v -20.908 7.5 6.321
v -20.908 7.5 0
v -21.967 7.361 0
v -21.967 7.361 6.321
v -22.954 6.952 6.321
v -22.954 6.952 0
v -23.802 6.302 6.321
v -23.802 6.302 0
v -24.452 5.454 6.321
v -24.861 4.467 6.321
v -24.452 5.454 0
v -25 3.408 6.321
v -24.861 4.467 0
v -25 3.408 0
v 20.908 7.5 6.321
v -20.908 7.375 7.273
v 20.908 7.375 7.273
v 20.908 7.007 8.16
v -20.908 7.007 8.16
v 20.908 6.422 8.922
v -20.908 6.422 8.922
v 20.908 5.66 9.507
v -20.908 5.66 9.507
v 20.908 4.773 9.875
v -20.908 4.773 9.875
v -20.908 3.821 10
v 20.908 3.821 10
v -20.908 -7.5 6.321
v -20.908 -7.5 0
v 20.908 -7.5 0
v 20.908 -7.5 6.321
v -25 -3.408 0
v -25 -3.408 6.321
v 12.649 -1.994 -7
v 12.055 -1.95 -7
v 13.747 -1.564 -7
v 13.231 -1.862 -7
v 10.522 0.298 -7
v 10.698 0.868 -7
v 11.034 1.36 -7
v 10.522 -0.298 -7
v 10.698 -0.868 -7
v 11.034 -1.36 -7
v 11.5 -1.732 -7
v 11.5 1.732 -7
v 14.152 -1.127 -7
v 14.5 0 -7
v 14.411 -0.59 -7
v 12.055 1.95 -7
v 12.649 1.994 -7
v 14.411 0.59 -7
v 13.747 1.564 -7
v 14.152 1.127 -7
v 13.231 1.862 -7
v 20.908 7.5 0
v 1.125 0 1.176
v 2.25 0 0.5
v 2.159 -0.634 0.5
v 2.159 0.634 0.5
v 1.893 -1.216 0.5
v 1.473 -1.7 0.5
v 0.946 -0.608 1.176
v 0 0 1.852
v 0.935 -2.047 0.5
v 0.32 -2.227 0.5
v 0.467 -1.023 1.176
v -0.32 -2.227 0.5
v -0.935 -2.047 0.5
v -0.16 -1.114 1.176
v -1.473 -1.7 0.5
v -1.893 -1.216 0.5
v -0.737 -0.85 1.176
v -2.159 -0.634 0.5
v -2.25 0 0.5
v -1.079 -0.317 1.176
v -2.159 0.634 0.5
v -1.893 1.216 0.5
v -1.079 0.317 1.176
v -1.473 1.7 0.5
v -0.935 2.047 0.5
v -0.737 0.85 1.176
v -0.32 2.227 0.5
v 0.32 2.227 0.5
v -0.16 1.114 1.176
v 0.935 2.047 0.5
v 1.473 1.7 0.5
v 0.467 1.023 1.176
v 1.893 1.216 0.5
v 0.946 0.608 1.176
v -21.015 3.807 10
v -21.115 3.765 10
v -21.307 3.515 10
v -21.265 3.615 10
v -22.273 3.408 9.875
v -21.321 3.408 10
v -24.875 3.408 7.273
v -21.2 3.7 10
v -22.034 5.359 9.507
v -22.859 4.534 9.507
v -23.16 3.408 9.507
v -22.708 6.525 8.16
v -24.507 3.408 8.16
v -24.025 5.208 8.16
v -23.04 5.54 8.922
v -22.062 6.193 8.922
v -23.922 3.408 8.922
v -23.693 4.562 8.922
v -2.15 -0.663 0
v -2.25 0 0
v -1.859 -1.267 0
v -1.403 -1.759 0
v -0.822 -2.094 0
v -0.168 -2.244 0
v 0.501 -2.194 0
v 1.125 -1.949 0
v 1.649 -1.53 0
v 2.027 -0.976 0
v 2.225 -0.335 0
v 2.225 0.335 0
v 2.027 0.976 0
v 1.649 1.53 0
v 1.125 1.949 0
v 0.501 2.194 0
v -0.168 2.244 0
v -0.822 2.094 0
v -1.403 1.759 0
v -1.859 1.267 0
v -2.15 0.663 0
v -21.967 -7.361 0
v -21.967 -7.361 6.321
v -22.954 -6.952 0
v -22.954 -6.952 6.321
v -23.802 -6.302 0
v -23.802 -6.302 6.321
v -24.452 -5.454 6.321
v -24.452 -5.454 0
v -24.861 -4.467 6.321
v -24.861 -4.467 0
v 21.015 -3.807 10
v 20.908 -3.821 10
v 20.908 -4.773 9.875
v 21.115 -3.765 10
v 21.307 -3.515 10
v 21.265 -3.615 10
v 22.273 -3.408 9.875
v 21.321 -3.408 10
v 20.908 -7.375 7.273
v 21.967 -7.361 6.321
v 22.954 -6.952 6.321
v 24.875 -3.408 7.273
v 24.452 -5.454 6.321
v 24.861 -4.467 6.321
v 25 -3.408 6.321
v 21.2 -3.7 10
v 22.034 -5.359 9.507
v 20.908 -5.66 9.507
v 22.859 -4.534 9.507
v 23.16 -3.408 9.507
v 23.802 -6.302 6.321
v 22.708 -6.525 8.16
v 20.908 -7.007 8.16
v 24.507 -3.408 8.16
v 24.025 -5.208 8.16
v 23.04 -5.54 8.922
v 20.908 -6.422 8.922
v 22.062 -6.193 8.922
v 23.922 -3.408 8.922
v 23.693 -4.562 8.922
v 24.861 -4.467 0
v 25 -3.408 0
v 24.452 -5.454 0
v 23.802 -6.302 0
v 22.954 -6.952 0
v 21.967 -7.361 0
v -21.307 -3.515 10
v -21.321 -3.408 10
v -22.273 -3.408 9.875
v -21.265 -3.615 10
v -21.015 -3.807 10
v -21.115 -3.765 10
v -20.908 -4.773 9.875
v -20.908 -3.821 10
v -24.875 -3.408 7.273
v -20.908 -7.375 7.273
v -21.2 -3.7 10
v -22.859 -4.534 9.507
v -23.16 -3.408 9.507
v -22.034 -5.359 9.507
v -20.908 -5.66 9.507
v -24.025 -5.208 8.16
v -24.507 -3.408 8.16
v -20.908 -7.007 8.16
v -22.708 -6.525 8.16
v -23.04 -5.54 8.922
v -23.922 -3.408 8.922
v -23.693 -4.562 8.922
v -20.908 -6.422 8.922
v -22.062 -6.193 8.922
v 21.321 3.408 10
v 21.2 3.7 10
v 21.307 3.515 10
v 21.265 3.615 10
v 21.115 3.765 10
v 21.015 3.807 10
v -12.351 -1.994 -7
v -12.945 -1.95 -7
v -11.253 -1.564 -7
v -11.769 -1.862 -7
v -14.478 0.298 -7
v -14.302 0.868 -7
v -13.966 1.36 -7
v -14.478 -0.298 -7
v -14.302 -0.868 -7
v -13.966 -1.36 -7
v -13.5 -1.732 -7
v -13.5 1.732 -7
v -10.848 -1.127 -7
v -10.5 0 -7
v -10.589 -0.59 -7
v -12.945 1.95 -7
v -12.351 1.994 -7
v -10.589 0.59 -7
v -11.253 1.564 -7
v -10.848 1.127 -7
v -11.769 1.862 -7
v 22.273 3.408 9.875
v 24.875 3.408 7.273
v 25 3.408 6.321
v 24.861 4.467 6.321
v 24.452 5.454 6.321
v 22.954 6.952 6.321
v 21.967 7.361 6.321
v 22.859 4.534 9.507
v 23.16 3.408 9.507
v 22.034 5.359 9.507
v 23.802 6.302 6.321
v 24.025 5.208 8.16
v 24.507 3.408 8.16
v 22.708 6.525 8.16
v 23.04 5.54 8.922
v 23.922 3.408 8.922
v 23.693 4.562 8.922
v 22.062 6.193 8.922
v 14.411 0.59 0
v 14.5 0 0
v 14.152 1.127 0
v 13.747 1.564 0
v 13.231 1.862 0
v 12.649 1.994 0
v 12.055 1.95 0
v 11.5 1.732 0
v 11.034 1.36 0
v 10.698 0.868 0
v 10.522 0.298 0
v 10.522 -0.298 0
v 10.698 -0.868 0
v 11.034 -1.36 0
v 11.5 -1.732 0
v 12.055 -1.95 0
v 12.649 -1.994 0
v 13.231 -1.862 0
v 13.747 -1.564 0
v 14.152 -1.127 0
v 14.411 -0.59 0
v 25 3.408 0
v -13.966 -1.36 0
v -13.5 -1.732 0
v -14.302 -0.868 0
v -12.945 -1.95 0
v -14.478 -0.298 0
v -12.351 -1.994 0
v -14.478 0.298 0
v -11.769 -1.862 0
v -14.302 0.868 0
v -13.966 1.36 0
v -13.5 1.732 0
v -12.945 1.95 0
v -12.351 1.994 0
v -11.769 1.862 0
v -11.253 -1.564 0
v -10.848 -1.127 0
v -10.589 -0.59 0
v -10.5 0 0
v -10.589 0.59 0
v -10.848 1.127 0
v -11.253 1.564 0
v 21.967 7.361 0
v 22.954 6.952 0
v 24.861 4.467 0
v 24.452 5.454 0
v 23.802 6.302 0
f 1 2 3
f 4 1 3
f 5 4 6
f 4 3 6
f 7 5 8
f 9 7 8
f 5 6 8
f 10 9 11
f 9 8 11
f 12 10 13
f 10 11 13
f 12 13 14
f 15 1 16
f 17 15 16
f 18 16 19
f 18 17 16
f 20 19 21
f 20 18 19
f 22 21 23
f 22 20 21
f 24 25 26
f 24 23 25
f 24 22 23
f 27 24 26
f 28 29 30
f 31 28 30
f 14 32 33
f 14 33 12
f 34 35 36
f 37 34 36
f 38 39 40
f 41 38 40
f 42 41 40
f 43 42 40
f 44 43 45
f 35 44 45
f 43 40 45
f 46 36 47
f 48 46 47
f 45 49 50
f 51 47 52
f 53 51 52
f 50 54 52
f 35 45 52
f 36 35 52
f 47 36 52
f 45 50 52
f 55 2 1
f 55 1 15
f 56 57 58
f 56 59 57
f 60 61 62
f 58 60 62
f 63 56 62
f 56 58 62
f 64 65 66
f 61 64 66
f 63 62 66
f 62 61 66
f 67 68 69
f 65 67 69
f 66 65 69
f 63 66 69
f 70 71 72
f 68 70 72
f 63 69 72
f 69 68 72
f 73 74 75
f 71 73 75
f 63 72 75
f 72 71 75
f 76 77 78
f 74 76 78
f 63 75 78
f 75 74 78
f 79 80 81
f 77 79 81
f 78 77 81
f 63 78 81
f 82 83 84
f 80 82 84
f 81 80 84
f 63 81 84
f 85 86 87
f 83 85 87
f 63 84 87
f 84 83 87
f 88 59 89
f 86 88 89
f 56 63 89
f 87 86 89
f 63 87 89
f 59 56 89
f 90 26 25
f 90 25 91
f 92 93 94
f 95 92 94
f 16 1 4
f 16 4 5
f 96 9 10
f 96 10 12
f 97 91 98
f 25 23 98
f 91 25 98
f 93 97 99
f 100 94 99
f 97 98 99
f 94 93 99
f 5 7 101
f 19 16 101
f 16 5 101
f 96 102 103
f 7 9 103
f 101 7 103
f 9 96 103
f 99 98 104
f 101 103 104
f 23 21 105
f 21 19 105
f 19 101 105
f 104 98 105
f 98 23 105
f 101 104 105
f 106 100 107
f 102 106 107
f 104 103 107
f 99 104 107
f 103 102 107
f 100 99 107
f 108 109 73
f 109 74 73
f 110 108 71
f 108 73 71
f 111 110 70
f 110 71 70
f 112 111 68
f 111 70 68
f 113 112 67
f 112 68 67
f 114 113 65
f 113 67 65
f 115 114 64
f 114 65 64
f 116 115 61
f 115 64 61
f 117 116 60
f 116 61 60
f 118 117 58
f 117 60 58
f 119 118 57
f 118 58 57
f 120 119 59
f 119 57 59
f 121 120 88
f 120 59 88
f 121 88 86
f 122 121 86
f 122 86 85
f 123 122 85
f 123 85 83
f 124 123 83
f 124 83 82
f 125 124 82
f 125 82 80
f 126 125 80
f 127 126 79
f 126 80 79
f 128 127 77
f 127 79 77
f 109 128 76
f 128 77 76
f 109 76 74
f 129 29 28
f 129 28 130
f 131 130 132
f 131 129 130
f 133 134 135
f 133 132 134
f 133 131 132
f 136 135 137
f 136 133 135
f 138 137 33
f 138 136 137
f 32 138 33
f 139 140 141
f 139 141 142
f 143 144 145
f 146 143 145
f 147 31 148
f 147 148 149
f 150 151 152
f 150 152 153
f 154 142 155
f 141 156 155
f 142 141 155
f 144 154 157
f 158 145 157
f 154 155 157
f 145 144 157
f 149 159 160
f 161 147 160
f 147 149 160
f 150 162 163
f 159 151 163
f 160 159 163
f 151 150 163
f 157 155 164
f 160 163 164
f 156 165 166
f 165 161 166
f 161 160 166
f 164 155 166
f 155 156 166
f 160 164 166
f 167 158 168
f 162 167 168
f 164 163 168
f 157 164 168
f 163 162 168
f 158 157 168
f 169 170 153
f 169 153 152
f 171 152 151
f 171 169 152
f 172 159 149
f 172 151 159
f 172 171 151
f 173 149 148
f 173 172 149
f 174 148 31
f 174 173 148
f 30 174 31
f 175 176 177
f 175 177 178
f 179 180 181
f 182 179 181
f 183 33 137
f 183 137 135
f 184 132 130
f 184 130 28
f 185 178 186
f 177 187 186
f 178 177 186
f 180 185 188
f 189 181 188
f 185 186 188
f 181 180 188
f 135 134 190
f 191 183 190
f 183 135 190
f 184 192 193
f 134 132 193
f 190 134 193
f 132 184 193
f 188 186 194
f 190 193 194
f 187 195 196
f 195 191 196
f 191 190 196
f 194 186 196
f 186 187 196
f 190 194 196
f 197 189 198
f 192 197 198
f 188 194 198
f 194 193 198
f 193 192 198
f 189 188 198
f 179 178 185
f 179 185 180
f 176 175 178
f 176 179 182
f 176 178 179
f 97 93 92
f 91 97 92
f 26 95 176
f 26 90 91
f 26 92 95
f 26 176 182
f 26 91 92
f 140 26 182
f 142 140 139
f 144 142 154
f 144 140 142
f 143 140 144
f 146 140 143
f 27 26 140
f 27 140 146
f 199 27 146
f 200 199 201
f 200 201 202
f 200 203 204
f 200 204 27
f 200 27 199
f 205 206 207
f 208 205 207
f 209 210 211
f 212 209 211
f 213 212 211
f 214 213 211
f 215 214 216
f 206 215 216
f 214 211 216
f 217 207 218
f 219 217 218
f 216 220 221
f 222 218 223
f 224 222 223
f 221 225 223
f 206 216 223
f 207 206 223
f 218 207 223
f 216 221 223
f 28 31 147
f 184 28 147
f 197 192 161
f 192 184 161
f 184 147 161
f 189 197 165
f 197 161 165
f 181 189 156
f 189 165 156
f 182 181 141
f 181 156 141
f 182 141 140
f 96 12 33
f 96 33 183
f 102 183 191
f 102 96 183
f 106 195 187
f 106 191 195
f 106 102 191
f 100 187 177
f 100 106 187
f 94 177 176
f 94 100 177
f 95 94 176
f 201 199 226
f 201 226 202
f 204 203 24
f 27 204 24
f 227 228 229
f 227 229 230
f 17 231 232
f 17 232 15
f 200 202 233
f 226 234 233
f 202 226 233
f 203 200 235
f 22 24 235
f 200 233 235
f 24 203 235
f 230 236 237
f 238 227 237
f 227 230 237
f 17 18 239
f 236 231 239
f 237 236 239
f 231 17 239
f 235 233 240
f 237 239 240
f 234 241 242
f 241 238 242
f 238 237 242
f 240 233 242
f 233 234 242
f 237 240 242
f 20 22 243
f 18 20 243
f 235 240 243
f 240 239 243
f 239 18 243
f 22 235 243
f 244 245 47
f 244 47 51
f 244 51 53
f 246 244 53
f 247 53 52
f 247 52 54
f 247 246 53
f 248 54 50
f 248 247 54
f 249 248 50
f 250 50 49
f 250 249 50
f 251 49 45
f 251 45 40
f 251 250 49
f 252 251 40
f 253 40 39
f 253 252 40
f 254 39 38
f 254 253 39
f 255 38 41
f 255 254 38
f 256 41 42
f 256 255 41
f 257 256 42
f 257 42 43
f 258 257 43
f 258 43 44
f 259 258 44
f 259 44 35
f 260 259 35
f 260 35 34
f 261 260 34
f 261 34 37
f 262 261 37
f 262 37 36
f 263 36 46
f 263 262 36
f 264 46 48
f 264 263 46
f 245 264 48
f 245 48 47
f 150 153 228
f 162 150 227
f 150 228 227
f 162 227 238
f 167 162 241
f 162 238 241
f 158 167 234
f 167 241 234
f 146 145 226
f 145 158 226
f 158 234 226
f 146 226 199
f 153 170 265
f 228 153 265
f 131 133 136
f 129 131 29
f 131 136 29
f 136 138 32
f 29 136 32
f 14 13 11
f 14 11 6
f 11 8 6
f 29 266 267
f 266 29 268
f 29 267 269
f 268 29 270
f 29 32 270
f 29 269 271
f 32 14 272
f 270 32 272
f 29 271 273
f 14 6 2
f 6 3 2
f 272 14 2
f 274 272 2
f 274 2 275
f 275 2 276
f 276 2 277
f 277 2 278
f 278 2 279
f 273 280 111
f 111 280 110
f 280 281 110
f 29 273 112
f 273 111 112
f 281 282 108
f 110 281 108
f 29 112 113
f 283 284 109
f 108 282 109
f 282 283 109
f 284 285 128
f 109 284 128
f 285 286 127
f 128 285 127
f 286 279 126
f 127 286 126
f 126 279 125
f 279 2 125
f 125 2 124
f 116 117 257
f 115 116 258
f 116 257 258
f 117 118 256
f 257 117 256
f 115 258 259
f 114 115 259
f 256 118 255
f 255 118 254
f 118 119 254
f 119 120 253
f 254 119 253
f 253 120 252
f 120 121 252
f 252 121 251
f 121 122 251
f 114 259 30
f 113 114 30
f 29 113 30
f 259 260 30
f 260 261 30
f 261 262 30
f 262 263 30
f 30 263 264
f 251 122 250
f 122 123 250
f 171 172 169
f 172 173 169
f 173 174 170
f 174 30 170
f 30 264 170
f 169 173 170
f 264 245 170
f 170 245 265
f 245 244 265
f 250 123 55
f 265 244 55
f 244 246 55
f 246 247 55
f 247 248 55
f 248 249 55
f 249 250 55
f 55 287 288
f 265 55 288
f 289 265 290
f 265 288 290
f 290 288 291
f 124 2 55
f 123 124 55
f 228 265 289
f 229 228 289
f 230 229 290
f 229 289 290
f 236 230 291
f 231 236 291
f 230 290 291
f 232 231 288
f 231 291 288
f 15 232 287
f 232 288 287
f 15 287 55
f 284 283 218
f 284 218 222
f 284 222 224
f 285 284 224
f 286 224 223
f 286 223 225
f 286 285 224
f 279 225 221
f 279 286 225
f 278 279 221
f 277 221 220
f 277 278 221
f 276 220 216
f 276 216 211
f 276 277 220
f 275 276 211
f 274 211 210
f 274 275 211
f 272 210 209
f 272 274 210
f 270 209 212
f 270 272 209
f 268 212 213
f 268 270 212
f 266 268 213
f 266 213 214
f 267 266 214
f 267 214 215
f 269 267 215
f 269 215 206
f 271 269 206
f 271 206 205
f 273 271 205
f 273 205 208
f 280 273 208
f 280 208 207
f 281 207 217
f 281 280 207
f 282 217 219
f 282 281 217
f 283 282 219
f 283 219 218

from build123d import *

# Parameters (mm, degrees)
F0_W         = 50
F0_H         = 15
F0_R         = 2
F1_DEPTH     = 10
F2_R         = 3.6792614691
F3_T1_DEPTH  = 20.2290713461
F3_T4_ANGLE  = 90
F3_T6_ANGLE  = 90
F3_T8_ANGLE  = 90
F3_T10_ANGLE = 90
F4_D         = 4.5
F4_DEPTH     = 0.5
F4_TIP       = 1.3519363928
F5_DEPTH     = 7


# Not quite as in the source:
# - a fillet or chamfer that OpenCascade refuses, or shapes differently, is made with other operations: its cross-section is extruded or revolved along the edge and cut away or added


with BuildPart() as f1:
    # F0 (on Top) → F1 (new body)
    with BuildSketch(Plane.XY):
        Rectangle(F0_W, F0_H)
        with Locations((-12.5, 0)):
            Circle(F0_R, mode=Mode.SUBTRACT)
        with Locations((12.5, 0)):
            Circle(F0_R, mode=Mode.SUBTRACT)
        with Locations((12.5, 0)):
            Circle(F0_R)
        with Locations((-12.5, 0)):
            Circle(F0_R)
    extrude(amount=F1_DEPTH)

    # F2
    f2_edges = [f1.edges().sort_by_distance(p)[0] for p in [
        (0, -7.5, 10),
        (-25, 0, 10),
        (25, 0, 10),
        (0, 7.5, 10),
    ]]
    fillet(f2_edges, radius=F2_R)

    # F3: fillet of radius 4.0916285384 on 4 edges, made by hand

    # F3_s2 → F3_t1 (cut)
    with BuildSketch(Plane.XY.offset(-10.2290713461)):
        with BuildLine():
            ThreePointArc((-20.9083714616, 7.5), (-23.8015897472, 6.3015897472), (-25, 3.4083714616))
            Line((-25, 3.4083714616), (-25, 7.5))
            Line((-25, 7.5), (-20.9083714616, 7.5))
        make_face()
        with BuildLine():
            ThreePointArc((-20.9083714616, -7.5), (-23.8015897472, -6.3015897472), (-25, -3.4083714616))
            Line((-25, -3.4083714616), (-25, -7.5))
            Line((-25, -7.5), (-20.9083714616, -7.5))
        make_face()
        with BuildLine():
            ThreePointArc((25, 3.4083714616), (23.8015897472, 6.3015897472), (20.9083714616, 7.5))
            Line((20.9083714616, 7.5), (25, 7.5))
            Line((25, 7.5), (25, 3.4083714616))
        make_face()
        with BuildLine():
            ThreePointArc((25, -3.4083714616), (23.8015897472, -6.3015897472), (20.9083714616, -7.5))
            Line((20.9083714616, -7.5), (25, -7.5))
            Line((25, -7.5), (25, -3.4083714616))
        make_face()
    extrude(amount=F3_T1_DEPTH, mode=Mode.SUBTRACT)

    # F3_s3 → F3_t4 (revolve, cut)
    with BuildSketch(Plane.YZ.offset(20.9083714616)):
        with BuildLine():
            ThreePointArc((-3.8207385309, 10), (-6.4223692655, 8.9223692655), (-7.5, 6.3207385309))
            Line((-7.5, 6.3207385309), (-7.5, 10))
            Line((-7.5, 10), (-3.8207385309, 10))
        make_face()
    revolve(axis=Axis((20.9083714616, -3.4083714616, 10), (0, 0, 1)), revolution_arc=F3_T4_ANGLE, mode=Mode.SUBTRACT)

    # F3_s5 → F3_t6 (revolve, cut)
    with BuildSketch(Plane.XZ.offset(-3.4083714616)):
        with BuildLine():
            ThreePointArc((21.3207385309, 10), (23.9223692655, 8.9223692655), (25, 6.3207385309))
            Line((25, 6.3207385309), (25, 10))
            Line((25, 10), (21.3207385309, 10))
        make_face()
    revolve(axis=Axis((20.9083714616, 3.4083714616, 10), (0, 0, 1)), revolution_arc=F3_T6_ANGLE, mode=Mode.SUBTRACT)

    # F3_s7 → F3_t8 (revolve, cut)
    with BuildSketch(Plane.XZ.offset(3.4083714616)):
        with BuildLine():
            ThreePointArc((-21.3207385309, 10), (-23.9223692655, 8.9223692655), (-25, 6.3207385309))
            Line((-25, 6.3207385309), (-25, 10))
            Line((-25, 10), (-21.3207385309, 10))
        make_face()
    revolve(axis=Axis((-20.9083714616, -3.4083714616, 10), (0, 0, 1)), revolution_arc=F3_T8_ANGLE, mode=Mode.SUBTRACT)

    # F3_s9 → F3_t10 (revolve, cut)
    with BuildSketch(Plane.YZ.offset(-20.9083714616)):
        with BuildLine():
            ThreePointArc((3.8207385309, 10), (6.4223692655, 8.9223692655), (7.5, 6.3207385309))
            Line((7.5, 6.3207385309), (7.5, 10))
            Line((7.5, 10), (3.8207385309, 10))
        make_face()
    revolve(axis=Axis((-20.9083714616, 3.4083714616, 10), (0, 0, 1)), revolution_arc=F3_T10_ANGLE, mode=Mode.SUBTRACT)

    # F4
    with Locations(Plane(origin=(0, 0, 0), x_dir=(1, 0, 0), z_dir=(0, 0, -1))):
        with Locations((0, 0)):
            Hole(F4_D / 2, depth=F4_DEPTH)
            with Locations((0, 0, -(F4_DEPTH + F4_TIP / 2))):  # 118° drill point
                Cone(0, F4_D / 2, F4_TIP, mode=Mode.SUBTRACT)

    # F0 (on Top) → F5 (join)
    with BuildSketch(Plane.XY):
        with Locations((12.5, 0)):
            Circle(F0_R)
        with Locations((-12.5, 0)):
            Circle(F0_R)
    extrude(amount=-F5_DEPTH)


solid = f1.part
